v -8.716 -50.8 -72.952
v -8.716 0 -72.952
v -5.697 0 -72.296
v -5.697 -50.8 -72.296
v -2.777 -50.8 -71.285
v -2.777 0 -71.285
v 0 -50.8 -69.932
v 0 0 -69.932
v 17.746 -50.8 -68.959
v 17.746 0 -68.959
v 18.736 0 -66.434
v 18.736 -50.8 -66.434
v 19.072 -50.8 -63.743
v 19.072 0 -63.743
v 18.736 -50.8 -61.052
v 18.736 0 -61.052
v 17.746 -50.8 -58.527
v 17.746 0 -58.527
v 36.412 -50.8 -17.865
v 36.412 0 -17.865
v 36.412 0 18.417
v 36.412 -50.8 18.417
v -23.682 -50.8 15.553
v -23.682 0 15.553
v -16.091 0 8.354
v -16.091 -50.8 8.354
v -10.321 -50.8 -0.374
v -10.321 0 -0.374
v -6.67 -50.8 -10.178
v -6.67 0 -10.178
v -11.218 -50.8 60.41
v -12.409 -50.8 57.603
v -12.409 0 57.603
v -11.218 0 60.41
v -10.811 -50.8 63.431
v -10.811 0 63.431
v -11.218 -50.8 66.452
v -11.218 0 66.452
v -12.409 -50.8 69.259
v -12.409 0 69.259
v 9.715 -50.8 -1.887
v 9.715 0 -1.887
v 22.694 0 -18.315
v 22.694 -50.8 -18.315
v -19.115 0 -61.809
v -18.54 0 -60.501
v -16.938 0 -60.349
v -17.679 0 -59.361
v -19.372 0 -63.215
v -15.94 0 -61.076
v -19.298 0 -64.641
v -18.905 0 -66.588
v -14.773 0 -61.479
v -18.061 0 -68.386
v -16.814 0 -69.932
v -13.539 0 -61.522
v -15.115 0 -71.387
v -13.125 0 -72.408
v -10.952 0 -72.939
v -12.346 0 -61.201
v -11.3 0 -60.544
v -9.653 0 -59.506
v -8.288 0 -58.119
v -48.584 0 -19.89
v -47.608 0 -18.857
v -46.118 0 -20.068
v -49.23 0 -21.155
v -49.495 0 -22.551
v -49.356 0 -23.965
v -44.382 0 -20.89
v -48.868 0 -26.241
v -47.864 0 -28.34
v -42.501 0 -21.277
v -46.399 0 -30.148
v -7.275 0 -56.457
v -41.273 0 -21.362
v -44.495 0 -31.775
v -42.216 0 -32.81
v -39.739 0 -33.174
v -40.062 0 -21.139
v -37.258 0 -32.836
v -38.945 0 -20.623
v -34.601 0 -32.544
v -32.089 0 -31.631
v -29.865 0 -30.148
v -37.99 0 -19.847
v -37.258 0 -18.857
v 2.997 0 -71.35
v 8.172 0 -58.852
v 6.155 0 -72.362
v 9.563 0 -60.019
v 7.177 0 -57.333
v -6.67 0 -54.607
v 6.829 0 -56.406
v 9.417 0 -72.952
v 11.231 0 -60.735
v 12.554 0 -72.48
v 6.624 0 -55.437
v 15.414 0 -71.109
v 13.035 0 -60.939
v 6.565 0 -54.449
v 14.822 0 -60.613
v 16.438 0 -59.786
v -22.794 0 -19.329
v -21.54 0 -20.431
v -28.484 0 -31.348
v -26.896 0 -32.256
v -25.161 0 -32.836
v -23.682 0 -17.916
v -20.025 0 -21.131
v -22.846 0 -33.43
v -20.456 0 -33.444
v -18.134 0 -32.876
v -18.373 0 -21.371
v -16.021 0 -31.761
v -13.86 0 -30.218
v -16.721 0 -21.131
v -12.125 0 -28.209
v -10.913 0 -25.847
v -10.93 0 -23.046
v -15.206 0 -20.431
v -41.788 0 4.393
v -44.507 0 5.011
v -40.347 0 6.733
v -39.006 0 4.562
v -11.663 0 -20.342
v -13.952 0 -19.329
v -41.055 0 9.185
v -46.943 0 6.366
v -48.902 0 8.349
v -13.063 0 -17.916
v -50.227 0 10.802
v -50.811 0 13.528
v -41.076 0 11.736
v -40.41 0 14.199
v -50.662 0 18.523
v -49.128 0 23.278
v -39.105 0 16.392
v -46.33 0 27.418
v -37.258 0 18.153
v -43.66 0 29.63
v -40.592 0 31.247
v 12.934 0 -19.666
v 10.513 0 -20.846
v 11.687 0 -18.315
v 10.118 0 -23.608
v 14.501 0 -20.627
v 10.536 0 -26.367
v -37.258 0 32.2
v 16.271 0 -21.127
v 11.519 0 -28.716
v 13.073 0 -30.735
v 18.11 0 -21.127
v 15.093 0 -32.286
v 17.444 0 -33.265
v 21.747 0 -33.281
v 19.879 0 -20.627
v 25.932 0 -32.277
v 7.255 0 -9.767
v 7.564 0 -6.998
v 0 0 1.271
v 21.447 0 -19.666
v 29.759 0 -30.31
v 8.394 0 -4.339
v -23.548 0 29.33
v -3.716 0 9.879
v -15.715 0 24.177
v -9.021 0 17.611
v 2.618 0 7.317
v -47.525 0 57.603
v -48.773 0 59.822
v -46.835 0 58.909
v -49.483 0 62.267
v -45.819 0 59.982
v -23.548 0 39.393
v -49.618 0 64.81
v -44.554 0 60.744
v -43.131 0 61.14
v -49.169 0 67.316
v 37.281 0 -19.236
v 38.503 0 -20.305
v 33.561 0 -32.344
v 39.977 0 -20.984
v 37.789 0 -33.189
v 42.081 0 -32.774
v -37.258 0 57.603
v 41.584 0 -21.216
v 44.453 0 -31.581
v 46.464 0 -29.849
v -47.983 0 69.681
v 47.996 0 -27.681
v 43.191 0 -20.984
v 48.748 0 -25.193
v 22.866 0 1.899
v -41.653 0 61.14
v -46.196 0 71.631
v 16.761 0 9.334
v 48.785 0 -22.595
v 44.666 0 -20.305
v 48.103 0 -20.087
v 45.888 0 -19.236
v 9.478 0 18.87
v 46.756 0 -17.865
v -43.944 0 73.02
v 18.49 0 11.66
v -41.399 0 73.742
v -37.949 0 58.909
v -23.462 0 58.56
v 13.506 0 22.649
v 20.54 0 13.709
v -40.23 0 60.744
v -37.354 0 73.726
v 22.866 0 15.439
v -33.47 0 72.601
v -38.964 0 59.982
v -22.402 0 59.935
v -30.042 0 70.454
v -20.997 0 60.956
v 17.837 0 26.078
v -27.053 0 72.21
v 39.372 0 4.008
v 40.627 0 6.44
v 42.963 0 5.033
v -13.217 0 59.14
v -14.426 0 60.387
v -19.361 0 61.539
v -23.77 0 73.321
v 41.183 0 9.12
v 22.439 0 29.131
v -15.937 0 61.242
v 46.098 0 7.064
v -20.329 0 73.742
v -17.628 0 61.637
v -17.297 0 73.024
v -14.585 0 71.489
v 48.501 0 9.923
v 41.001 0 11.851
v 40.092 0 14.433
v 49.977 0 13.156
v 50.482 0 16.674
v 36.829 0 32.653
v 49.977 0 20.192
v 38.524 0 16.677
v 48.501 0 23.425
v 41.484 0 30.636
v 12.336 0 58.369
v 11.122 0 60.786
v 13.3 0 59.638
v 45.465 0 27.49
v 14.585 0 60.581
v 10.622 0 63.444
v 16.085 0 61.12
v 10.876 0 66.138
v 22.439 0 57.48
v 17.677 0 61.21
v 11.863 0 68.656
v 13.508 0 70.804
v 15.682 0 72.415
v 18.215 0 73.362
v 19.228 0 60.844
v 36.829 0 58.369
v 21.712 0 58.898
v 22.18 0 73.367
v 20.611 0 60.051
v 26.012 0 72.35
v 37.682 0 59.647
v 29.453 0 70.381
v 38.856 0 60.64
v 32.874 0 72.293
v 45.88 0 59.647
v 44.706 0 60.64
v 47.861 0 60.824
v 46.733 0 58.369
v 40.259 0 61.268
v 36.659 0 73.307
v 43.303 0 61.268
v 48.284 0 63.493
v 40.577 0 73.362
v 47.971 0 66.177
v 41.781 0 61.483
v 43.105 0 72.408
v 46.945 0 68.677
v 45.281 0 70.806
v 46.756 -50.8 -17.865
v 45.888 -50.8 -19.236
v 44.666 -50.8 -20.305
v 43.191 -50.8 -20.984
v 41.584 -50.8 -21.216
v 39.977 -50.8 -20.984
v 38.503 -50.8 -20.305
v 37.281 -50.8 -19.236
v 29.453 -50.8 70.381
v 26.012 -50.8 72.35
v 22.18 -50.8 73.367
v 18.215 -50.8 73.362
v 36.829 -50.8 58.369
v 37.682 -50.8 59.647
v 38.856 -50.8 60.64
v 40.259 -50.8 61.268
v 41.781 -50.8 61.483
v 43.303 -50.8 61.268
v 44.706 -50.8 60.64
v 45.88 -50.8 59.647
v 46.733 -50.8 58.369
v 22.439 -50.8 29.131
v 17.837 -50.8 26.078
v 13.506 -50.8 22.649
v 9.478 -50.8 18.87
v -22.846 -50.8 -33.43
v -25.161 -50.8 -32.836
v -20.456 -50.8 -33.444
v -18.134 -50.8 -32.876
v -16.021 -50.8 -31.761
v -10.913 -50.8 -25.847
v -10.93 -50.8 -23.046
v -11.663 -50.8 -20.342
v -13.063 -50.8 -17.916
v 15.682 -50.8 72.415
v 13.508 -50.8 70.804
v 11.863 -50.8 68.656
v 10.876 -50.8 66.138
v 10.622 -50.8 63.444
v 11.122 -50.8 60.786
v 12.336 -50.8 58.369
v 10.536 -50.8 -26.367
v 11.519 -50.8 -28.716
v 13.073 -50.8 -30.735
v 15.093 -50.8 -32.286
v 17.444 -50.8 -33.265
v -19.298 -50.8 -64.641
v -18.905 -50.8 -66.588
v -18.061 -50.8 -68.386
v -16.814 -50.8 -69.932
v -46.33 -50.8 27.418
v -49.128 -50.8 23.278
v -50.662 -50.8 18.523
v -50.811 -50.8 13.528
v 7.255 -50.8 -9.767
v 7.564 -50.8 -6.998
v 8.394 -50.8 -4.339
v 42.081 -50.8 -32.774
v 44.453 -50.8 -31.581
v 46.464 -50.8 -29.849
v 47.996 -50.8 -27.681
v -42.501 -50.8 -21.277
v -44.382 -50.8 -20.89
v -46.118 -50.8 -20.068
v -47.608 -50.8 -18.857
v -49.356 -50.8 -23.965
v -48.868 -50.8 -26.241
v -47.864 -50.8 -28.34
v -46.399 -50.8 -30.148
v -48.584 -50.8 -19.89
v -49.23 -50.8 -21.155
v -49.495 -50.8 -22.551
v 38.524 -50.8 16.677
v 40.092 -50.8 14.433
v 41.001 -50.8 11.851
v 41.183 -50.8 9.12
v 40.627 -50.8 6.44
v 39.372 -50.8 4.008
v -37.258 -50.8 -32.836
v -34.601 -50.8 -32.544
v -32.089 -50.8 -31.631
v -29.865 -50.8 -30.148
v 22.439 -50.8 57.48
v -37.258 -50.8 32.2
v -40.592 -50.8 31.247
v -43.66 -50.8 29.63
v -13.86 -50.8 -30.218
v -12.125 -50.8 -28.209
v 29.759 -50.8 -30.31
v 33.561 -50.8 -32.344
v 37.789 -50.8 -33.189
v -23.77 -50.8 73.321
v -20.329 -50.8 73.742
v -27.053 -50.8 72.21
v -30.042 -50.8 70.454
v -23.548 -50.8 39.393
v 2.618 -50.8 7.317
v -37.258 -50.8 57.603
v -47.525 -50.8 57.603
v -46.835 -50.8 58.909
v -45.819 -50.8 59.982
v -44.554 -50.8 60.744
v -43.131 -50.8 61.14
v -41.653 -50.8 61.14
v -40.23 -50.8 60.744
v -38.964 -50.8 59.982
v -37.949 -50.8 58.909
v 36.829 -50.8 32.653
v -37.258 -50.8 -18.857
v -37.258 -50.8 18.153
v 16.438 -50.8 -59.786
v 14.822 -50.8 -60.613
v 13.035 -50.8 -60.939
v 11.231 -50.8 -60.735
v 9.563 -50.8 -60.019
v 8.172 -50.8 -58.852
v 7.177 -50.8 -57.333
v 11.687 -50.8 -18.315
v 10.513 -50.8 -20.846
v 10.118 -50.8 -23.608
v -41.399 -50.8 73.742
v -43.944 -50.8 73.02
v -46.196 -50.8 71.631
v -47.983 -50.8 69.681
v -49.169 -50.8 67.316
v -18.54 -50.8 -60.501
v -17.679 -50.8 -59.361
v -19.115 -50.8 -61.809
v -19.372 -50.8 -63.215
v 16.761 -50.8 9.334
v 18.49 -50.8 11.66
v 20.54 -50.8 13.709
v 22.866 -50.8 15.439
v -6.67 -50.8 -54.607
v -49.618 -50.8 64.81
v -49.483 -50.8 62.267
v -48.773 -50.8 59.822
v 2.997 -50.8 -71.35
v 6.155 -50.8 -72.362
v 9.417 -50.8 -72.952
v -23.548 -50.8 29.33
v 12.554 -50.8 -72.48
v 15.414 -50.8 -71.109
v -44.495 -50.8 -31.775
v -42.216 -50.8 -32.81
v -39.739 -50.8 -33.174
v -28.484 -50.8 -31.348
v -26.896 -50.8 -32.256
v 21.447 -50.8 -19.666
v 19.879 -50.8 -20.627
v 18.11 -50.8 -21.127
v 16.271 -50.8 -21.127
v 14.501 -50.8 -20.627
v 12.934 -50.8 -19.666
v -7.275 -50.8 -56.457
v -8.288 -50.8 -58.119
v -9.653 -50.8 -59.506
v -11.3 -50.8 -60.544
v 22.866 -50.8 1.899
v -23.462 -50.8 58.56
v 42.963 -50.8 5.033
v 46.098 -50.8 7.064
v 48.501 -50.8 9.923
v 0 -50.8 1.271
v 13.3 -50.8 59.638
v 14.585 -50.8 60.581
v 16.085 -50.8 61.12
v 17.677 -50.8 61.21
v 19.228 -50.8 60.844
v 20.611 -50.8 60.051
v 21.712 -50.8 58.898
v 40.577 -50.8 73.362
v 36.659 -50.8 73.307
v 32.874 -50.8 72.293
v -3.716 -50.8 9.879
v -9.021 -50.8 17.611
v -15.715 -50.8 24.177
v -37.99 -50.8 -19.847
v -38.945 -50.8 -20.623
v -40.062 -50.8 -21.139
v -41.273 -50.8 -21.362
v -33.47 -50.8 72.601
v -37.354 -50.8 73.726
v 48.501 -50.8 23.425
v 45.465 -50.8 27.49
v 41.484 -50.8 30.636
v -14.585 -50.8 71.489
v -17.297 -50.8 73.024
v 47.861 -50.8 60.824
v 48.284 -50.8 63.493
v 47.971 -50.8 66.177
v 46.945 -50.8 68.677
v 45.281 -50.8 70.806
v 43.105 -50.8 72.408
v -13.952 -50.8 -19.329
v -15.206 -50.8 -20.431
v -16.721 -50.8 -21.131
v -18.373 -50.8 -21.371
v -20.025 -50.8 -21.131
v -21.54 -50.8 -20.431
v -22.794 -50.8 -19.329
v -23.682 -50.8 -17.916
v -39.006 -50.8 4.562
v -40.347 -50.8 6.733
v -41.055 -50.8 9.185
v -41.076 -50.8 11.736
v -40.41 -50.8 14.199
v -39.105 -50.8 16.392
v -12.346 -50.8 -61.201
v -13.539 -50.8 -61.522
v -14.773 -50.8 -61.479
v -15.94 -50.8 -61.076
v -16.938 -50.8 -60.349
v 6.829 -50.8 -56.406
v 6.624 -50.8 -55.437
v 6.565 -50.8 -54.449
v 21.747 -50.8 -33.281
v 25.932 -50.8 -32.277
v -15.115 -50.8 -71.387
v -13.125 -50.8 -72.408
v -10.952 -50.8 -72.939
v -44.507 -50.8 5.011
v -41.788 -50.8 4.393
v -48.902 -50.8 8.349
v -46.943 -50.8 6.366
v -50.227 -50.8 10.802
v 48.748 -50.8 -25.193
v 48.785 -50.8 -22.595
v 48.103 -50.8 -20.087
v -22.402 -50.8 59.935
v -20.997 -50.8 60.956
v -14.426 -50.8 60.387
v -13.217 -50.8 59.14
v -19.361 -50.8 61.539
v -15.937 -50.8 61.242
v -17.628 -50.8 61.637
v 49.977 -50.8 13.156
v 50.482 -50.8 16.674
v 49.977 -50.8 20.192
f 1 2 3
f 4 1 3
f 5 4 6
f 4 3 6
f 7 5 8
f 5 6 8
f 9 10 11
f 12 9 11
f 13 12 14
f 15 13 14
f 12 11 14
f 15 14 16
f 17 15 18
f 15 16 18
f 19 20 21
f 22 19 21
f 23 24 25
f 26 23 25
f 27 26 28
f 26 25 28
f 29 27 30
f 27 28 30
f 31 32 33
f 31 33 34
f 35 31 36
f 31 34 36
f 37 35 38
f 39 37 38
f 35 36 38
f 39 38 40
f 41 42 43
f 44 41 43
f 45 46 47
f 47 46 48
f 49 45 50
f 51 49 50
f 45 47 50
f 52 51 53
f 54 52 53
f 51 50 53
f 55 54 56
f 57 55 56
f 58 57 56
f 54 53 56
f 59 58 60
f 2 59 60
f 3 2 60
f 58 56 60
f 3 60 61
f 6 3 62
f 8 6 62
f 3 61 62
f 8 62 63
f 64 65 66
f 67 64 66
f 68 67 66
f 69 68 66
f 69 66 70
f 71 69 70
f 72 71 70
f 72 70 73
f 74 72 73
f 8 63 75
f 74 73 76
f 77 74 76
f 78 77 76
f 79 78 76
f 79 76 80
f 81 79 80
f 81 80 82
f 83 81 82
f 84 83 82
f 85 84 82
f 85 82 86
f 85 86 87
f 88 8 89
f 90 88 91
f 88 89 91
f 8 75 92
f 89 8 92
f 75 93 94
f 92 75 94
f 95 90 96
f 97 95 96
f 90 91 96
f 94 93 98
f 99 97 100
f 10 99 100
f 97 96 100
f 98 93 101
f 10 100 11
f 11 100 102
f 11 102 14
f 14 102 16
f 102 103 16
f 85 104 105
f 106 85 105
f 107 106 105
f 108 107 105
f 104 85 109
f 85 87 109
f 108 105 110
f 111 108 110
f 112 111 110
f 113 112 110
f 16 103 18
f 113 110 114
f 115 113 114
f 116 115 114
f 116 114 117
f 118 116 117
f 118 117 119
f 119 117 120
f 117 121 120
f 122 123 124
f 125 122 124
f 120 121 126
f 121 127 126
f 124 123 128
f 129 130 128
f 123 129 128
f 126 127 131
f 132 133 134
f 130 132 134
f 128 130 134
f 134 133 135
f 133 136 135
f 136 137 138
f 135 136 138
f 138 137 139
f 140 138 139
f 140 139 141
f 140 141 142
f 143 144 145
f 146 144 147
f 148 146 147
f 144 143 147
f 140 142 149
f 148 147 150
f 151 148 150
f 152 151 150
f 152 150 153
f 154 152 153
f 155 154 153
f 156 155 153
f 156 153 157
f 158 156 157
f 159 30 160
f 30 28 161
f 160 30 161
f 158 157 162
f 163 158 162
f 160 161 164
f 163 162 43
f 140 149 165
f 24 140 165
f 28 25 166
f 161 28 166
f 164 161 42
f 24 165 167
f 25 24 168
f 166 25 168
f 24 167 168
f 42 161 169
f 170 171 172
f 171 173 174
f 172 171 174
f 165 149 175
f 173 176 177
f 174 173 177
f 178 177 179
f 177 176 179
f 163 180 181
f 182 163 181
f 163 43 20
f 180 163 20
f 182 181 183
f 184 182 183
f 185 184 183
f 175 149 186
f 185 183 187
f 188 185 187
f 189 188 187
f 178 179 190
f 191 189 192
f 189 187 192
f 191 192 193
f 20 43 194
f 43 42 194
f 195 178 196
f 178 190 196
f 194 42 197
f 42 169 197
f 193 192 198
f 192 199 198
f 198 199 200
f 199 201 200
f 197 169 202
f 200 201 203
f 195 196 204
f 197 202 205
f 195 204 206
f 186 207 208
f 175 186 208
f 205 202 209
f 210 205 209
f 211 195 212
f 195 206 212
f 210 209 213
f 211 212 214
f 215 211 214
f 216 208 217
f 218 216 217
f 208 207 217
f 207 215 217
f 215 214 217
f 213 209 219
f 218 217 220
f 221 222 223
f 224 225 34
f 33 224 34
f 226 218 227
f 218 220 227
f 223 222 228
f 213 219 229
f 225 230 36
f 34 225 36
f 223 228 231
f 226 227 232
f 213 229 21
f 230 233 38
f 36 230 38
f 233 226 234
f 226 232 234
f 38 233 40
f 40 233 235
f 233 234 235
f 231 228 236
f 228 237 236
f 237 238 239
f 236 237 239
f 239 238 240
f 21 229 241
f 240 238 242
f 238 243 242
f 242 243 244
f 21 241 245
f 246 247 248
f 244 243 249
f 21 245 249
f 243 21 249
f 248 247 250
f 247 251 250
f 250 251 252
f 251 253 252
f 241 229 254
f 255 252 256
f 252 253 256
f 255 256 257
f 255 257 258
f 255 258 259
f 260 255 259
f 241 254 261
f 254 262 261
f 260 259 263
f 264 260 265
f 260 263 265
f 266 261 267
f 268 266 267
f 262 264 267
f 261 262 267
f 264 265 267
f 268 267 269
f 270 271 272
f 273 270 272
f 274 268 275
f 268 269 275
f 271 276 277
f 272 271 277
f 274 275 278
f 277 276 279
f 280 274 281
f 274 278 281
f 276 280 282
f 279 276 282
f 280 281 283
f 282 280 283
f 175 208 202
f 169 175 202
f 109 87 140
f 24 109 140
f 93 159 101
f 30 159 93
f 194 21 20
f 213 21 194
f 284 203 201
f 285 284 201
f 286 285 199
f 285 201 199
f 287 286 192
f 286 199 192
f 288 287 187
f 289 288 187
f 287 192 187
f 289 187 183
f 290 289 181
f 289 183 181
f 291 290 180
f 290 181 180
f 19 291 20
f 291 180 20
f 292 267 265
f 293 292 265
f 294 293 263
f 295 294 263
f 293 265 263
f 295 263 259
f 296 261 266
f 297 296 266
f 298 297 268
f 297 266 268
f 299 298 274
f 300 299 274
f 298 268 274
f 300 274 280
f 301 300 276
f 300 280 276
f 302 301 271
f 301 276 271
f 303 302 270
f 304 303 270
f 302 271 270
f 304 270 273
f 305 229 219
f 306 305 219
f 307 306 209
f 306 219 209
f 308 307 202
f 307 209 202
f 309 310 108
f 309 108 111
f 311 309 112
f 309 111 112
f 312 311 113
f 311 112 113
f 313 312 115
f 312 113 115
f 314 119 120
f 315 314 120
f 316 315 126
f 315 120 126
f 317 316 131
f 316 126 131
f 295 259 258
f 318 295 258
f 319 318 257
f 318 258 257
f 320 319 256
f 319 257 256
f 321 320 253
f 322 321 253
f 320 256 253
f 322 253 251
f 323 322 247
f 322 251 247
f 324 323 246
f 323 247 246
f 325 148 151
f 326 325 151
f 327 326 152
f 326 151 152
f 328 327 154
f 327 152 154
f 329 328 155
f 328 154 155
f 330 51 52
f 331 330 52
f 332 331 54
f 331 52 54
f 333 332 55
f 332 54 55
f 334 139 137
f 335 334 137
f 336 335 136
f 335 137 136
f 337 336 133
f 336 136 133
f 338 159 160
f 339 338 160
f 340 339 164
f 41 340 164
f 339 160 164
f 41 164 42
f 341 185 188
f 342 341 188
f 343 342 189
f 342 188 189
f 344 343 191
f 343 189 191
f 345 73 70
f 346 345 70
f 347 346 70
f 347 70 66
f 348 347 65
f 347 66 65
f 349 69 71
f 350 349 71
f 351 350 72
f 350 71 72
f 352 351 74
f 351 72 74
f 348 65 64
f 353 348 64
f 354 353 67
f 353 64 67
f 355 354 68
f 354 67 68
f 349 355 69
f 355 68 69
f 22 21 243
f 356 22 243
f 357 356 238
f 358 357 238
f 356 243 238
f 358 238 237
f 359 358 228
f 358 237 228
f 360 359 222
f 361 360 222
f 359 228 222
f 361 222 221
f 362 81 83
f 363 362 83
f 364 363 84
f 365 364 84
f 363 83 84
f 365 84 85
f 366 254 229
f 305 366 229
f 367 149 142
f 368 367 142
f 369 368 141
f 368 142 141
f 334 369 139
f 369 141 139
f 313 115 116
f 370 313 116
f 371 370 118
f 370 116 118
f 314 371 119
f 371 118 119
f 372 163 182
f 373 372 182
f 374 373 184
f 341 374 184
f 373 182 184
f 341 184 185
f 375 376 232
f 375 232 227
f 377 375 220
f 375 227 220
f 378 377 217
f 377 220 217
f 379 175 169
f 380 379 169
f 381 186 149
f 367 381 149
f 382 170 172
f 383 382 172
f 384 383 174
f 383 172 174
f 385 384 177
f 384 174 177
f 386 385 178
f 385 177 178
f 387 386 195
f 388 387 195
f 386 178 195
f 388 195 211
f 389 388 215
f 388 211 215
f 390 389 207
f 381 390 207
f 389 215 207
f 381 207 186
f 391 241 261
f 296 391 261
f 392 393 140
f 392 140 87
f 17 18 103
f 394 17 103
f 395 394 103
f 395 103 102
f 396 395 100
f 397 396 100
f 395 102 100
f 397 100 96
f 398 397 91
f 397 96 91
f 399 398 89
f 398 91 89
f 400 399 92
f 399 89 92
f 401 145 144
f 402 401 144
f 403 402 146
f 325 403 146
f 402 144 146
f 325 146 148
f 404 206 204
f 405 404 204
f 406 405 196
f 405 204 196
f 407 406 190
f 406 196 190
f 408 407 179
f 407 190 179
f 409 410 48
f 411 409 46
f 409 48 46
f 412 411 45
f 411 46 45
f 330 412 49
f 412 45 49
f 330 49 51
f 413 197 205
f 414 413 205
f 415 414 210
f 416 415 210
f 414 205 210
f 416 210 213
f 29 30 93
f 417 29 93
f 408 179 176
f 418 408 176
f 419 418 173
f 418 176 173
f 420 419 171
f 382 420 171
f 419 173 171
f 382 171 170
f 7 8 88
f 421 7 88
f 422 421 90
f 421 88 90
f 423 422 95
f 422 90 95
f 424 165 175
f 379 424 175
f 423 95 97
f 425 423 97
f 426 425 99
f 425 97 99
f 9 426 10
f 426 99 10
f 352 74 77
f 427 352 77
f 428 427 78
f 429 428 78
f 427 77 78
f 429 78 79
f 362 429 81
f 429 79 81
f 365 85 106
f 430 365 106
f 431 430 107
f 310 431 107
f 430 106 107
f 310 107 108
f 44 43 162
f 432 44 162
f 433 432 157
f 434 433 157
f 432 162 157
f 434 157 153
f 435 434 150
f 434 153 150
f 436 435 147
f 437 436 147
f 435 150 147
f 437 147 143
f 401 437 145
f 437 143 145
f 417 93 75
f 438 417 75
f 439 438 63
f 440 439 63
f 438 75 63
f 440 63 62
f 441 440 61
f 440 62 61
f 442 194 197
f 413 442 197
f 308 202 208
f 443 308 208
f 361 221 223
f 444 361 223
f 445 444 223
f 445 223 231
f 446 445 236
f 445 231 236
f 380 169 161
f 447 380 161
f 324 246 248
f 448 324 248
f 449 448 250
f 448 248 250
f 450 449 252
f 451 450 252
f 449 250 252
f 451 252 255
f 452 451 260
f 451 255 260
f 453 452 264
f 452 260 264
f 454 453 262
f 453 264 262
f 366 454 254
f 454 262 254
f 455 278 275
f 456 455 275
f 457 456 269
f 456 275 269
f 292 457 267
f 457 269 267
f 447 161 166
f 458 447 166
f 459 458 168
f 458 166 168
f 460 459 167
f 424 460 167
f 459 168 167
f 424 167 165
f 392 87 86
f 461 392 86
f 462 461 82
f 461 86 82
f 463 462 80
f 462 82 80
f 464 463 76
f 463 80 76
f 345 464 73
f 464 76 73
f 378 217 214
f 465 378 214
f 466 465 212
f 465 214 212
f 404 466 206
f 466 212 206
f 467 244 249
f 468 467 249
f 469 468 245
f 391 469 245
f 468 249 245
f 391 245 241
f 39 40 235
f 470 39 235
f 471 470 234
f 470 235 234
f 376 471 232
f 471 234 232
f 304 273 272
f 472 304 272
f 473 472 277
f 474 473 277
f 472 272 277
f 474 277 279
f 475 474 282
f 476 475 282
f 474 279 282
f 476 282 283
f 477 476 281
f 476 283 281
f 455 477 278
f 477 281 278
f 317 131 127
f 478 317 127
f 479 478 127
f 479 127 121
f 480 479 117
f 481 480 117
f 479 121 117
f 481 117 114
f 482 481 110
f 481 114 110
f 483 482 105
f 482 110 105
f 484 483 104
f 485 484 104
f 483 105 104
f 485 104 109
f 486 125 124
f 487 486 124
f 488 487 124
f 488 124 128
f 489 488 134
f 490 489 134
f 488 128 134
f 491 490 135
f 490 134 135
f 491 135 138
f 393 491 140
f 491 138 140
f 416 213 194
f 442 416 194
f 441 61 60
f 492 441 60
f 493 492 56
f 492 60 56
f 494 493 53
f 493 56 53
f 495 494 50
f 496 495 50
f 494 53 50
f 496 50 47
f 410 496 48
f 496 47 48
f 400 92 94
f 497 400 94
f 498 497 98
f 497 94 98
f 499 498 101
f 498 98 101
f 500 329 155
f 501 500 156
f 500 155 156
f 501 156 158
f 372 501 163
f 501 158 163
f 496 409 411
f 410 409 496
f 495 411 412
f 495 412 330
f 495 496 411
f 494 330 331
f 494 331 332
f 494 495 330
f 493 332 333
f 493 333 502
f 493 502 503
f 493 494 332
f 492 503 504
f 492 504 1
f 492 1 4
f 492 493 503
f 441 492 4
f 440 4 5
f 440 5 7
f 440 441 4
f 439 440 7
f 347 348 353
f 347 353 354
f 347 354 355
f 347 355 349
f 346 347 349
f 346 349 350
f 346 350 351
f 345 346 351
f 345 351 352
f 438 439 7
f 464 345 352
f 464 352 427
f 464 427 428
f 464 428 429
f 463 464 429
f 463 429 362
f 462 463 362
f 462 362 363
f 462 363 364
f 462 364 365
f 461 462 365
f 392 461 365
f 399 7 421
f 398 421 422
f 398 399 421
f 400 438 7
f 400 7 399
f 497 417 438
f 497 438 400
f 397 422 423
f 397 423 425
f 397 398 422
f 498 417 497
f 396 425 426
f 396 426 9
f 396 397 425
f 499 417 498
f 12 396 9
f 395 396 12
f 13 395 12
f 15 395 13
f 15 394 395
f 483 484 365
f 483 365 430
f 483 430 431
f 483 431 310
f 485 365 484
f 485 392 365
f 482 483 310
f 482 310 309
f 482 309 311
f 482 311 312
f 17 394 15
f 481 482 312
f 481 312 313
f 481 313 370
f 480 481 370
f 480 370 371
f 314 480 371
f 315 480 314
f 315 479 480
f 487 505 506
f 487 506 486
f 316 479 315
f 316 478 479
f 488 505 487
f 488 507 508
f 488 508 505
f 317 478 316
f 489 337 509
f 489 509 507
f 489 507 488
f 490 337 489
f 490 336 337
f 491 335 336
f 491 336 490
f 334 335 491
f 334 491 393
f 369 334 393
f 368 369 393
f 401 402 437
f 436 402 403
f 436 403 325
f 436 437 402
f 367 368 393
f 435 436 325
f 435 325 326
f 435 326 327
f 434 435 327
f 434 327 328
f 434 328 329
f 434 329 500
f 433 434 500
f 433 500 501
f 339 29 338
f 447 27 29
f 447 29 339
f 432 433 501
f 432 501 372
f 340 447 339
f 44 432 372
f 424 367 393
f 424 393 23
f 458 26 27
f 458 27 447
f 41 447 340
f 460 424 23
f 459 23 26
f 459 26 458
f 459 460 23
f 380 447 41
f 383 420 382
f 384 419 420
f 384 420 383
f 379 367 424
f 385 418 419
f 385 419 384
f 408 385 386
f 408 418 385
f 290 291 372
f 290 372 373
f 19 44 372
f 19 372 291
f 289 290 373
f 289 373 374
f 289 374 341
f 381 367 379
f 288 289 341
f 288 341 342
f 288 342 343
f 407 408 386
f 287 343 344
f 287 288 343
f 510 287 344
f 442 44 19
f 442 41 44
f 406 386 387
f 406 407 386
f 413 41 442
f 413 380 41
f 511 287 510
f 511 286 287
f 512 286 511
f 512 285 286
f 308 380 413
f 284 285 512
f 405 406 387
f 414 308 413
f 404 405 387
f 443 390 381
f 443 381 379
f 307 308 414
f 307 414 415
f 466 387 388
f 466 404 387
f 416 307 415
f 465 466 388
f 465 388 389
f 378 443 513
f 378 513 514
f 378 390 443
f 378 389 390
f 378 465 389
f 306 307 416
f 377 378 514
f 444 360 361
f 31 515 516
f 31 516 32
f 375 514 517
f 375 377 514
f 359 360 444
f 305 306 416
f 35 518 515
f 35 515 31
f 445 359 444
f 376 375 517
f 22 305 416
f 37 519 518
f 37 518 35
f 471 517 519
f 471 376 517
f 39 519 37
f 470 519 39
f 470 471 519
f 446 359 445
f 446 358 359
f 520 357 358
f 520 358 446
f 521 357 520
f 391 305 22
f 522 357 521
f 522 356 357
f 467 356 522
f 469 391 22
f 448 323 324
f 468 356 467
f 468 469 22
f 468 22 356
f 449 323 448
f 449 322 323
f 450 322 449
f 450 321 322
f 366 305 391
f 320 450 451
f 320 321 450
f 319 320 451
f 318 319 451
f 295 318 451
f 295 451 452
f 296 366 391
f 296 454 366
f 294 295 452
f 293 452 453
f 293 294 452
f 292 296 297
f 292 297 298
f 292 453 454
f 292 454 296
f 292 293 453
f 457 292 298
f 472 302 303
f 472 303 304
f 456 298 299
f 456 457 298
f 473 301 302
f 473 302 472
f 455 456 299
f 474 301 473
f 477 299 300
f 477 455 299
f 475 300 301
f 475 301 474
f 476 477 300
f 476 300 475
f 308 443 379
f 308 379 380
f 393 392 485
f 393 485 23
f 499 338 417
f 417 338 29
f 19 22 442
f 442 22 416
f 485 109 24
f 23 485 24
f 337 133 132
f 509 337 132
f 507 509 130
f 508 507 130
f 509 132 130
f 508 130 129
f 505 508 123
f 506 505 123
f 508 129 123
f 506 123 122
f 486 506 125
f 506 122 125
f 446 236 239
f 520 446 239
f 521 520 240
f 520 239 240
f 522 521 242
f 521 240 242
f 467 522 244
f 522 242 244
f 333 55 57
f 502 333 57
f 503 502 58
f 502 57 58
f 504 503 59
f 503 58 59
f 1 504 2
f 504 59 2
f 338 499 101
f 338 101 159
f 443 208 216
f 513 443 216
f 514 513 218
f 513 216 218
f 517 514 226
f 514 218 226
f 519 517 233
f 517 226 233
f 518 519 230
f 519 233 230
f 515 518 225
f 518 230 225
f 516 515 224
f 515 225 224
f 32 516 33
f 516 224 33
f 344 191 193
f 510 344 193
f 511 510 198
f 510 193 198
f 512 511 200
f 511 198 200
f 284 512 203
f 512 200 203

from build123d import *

# Parameters (mm, degrees)
F1_DEPTH = 50.8


with BuildPart() as f1:
    # F0 (on Front) → F1 (new body)
    with BuildSketch(Plane.XZ):
        with BuildLine():
            ThreePointArc((22.439383, 29.13105), (15.63549, 24.408793), (9.478033, 18.869985))
            Line((9.478033, 18.869985), (-23.461929, 58.559932))
            ThreePointArc((-23.461929, 58.559932), (-17.627724, 61.636811), (-12.409047, 57.603136))
            ThreePointArc((-12.409047, 57.603136), (-10.811238, 63.430969), (-12.409047, 69.258802))
            ThreePointArc((-12.409047, 69.258802), (-15.886595, 72.352499), (-20.328924, 73.741749))
            ThreePointArc((-20.328924, 73.741749), (-25.439806, 72.849507), (-30.041976, 70.454255))
            ThreePointArc((-30.041976, 70.454255), (-35.3729, 73.298377), (-41.398779, 73.741749))
            ThreePointArc((-41.398779, 73.741749), (-46.195621, 71.631394), (-49.169224, 67.316189))
            ThreePointArc((-49.169224, 67.316189), (-49.483254, 62.267433), (-47.525477, 57.603136))
            ThreePointArc((-47.525477, 57.603136), (-42.391887, 61.189751), (-37.258297, 57.603136))
            Line((-37.258297, 57.603136), (-37.258297, 32.199763))
            ThreePointArc((-37.258297, 32.199763), (-42.167966, 30.518016), (-46.330024, 27.41795))
            ThreePointArc((-46.330024, 27.41795), (-50.063504, 20.954714), (-50.81061, 13.528131))
            ThreePointArc((-50.81061, 13.528131), (-46.942892, 6.36599), (-39.005515, 4.562234))
            ThreePointArc((-39.005515, 4.562234), (-41.07612, 11.736213), (-37.258297, 18.153191))
            Line((-37.258297, 18.153191), (-37.258297, -18.857189))
            ThreePointArc((-37.258297, -18.857189), (-39.487397, -20.916304), (-42.500529, -21.276681))
            ThreePointArc((-42.500529, -21.276681), (-45.274392, -20.531283), (-47.608346, -18.857189))
            ThreePointArc((-47.608346, -18.857189), (-49.230344, -21.155103), (-49.355764, -23.965007))
            ThreePointArc((-49.355764, -23.965007), (-48.428049, -27.320039), (-46.398599, -30.148152))
            ThreePointArc((-46.398599, -30.148152), (-42.216094, -32.810312), (-37.258297, -32.836478))
            ThreePointArc((-37.258297, -32.836478), (-33.318107, -32.162609), (-29.865403, -30.148152))
            ThreePointArc((-29.865403, -30.148152), (-27.712308, -31.840895), (-25.160836, -32.836478))
            ThreePointArc((-25.160836, -32.836478), (-20.455986, -33.443738), (-16.020531, -31.761147))
            ThreePointArc((-16.020531, -31.761147), (-12.932619, -29.265174), (-10.912713, -25.846833))
            ThreePointArc((-10.912713, -25.846833), (-11.2086, -21.67018), (-13.063374, -17.916275))
            ThreePointArc((-13.063374, -17.916275), (-18.372816, -21.371176), (-23.682257, -17.916275))
            Line((-23.682257, -17.916275), (-23.682257, 15.553372))
            ThreePointArc((-23.682257, 15.553372), (-12.957597, 4.154356), (-6.669553, -10.177998))
            Line((-6.669553, -10.177998), (-6.669553, -54.607033))
            ThreePointArc((-6.669553, -54.607033), (-8.287699, -58.119332), (-11.300034, -60.544301))
            ThreePointArc((-11.300034, -60.544301), (-14.772838, -61.47915), (-17.679371, -59.361041))
            ThreePointArc((-17.679371, -59.361041), (-19.114876, -61.809201), (-19.297592, -64.641298))
            ThreePointArc((-19.297592, -64.641298), (-18.536614, -67.512258), (-16.814196, -69.931922))
            ThreePointArc((-16.814196, -69.931922), (-13.12521, -72.407987), (-8.715694, -72.95177))
            ThreePointArc((-8.715694, -72.95177), (-4.221828, -71.834414), (0, -69.931922))
            ThreePointArc((0, -69.931922), (4.559252, -71.907947), (9.41743, -72.95177))
            ThreePointArc((9.41743, -72.95177), (14.035159, -71.901137), (17.746311, -68.959267))
            ThreePointArc((17.746311, -68.959267), (19.072395, -63.743091), (17.746311, -58.526916))
            ThreePointArc((17.746311, -58.526916), (12.125868, -60.902929), (7.176861, -57.333316))
            ThreePointArc((7.176861, -57.333316), (6.708307, -55.925452), (6.564894, -54.448612))
            Line((6.564894, -54.448612), (7.254593, -9.766534))
            ThreePointArc((7.254593, -9.766534), (7.915044, -5.648664), (9.714889, -1.886536))
            Line((9.714889, -1.886536), (22.694213, -18.315103))
            ThreePointArc((22.694213, -18.315103), (17.190391, -21.190166), (11.686569, -18.315103))
            ThreePointArc((11.686569, -18.315103), (10.214197, -22.212635), (10.536366, -26.36653))
            ThreePointArc((10.536366, -26.36653), (13.072681, -30.734713), (17.444285, -33.265127))
            ThreePointArc((17.444285, -33.265127), (23.869566, -32.903906), (29.75891, -30.309618))
            ThreePointArc((29.75891, -30.309618), (35.644058, -32.921994), (42.081258, -32.773871))
            ThreePointArc((42.081258, -32.773871), (45.511296, -30.776469), (47.995683, -27.680892))
            ThreePointArc((47.995683, -27.680892), (48.784561, -22.594925), (46.756167, -17.864702))
            ThreePointArc((46.756167, -17.864702), (41.584109, -21.216198), (36.41205, -17.864702))
            Line((36.41205, -17.864702), (36.41205, 18.417337))
            ThreePointArc((36.41205, 18.417337), (41.00077, 11.851308), (39.371705, 4.008144))
            ThreePointArc((39.371705, 4.008144), (44.606315, 5.931777), (48.501298, 9.923093))
            ThreePointArc((48.501298, 9.923093), (50.482427, 16.674256), (48.501298, 23.425419))
            ThreePointArc((48.501298, 23.425419), (43.576958, 29.192803), (36.828664, 32.652915))
            Line((36.828664, 32.652915), (36.828664, 58.368564))
            ThreePointArc((36.828664, 58.368564), (41.780885, 61.482849), (46.733106, 58.368564))
            ThreePointArc((46.733106, 58.368564), (47.54337, 67.461962), (40.576808, 73.362254))
            ThreePointArc((40.576808, 73.362254), (34.734779, 72.917336), (29.45341, 70.380725))
            ThreePointArc((29.45341, 70.380725), (24.129346, 72.98331), (18.215336, 73.362254))
            ThreePointArc((18.215336, 73.362254), (11.281464, 67.4316), (12.336258, 58.368564))
            ThreePointArc((12.336258, 58.368564), (17.676832, 61.210114), (22.439383, 57.479933))
            Line((22.439383, 57.479933), (22.439383, 29.13105))
        make_face()
        with BuildLine():
            Line((-23.548043, 29.330348), (-23.548043, 39.393221))
            Line((-23.548043, 39.393221), (2.61824, 7.316703))
            Line((2.61824, 7.316703), (0, 1.270827))
            ThreePointArc((0, 1.270827), (-9.020803, 17.611136), (-23.548043, 29.330348))
        make_face(mode=Mode.SUBTRACT)
        with BuildLine():
            ThreePointArc((16.760936, 9.333754), (19.47767, 12.721904), (22.865819, 15.43864))
            Line((22.865819, 15.43864), (22.865819, 1.898702))
            Line((22.865819, 1.898702), (16.760936, 9.333754))
        make_face(mode=Mode.SUBTRACT)
    extrude(amount=F1_DEPTH)


solid = f1.part
